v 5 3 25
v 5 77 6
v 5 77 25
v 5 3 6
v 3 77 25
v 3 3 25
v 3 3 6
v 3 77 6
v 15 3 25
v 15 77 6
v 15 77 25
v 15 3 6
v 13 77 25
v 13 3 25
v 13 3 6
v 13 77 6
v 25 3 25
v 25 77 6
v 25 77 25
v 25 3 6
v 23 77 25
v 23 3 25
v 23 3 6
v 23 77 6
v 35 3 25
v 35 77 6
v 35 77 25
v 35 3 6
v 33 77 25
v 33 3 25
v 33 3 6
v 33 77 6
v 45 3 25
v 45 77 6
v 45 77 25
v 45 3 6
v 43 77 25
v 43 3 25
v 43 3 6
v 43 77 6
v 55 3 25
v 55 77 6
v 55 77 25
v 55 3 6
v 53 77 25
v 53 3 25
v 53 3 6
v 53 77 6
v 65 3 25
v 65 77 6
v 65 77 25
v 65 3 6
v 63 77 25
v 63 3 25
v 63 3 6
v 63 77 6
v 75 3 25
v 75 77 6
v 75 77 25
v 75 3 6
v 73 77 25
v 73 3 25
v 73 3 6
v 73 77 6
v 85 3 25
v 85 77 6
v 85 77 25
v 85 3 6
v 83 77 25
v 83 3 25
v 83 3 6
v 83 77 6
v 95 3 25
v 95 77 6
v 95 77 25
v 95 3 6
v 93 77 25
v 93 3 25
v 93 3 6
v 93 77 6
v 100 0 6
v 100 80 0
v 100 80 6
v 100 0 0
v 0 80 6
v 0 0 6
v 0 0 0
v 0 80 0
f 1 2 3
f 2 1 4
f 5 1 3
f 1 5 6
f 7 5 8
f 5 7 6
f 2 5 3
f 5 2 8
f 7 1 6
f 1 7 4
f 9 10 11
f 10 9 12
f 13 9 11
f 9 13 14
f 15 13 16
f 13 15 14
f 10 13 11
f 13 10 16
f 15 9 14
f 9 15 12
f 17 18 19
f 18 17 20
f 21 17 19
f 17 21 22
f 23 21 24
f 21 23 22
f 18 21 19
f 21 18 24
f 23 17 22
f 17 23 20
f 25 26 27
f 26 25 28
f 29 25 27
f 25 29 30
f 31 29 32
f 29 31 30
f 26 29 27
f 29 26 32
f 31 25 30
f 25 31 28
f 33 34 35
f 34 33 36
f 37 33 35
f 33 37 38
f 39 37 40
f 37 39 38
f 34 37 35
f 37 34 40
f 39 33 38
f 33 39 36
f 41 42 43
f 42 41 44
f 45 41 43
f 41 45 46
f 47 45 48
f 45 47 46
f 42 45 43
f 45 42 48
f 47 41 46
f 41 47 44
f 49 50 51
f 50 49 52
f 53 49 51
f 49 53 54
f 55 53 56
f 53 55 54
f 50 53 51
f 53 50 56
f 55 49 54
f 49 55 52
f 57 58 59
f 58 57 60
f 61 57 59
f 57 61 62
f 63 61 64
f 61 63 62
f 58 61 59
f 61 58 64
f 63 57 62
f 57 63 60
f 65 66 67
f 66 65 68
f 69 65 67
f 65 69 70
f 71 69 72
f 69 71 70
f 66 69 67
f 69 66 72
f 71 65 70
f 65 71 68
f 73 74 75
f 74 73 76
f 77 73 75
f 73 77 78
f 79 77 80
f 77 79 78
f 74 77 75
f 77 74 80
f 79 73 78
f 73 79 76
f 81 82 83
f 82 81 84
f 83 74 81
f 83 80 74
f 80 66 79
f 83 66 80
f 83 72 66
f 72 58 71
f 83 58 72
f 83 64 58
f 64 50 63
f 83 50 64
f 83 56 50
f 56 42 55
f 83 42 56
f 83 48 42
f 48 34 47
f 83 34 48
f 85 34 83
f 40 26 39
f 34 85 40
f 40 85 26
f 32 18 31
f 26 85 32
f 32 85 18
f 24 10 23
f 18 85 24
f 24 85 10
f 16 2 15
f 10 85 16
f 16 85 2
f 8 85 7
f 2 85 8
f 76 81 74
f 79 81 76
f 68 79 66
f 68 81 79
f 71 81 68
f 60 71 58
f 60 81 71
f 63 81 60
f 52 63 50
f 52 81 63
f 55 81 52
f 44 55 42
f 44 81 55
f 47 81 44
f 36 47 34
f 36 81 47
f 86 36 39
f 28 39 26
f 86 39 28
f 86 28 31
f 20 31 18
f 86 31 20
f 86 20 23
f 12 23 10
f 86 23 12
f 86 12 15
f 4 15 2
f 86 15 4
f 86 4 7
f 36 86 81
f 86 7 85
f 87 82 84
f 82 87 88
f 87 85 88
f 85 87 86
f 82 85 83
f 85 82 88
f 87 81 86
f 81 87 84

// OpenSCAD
$fn = 32;

// ----------------------------------------------------------------------
// Heatsink: uniform fin block
// ----------------------------------------------------------------------

// --- parameters (mm) ---
base_l = 100;             // base length, X
base_w = 80;              // base width, Y
base_t = 6;               // base plate thickness
fin_h = 20;               // fin height above the base
fin_t = 2;                // fin thickness
edge = 3;                 // margin from the base ends
pitch = 10;               // fin pitch

n_fins = floor((base_l - 2 * edge - fin_t) / pitch) + 1;  // fin count
total_h = base_t + fin_h - 1;  // overall height

union() {
  cube([base_l, base_w, base_t]);
  for (i = [0 : n_fins - 1])
    translate([edge + i * pitch, edge, base_t - 1])
      cube([fin_t, base_w - 2 * edge, fin_h]);
}
